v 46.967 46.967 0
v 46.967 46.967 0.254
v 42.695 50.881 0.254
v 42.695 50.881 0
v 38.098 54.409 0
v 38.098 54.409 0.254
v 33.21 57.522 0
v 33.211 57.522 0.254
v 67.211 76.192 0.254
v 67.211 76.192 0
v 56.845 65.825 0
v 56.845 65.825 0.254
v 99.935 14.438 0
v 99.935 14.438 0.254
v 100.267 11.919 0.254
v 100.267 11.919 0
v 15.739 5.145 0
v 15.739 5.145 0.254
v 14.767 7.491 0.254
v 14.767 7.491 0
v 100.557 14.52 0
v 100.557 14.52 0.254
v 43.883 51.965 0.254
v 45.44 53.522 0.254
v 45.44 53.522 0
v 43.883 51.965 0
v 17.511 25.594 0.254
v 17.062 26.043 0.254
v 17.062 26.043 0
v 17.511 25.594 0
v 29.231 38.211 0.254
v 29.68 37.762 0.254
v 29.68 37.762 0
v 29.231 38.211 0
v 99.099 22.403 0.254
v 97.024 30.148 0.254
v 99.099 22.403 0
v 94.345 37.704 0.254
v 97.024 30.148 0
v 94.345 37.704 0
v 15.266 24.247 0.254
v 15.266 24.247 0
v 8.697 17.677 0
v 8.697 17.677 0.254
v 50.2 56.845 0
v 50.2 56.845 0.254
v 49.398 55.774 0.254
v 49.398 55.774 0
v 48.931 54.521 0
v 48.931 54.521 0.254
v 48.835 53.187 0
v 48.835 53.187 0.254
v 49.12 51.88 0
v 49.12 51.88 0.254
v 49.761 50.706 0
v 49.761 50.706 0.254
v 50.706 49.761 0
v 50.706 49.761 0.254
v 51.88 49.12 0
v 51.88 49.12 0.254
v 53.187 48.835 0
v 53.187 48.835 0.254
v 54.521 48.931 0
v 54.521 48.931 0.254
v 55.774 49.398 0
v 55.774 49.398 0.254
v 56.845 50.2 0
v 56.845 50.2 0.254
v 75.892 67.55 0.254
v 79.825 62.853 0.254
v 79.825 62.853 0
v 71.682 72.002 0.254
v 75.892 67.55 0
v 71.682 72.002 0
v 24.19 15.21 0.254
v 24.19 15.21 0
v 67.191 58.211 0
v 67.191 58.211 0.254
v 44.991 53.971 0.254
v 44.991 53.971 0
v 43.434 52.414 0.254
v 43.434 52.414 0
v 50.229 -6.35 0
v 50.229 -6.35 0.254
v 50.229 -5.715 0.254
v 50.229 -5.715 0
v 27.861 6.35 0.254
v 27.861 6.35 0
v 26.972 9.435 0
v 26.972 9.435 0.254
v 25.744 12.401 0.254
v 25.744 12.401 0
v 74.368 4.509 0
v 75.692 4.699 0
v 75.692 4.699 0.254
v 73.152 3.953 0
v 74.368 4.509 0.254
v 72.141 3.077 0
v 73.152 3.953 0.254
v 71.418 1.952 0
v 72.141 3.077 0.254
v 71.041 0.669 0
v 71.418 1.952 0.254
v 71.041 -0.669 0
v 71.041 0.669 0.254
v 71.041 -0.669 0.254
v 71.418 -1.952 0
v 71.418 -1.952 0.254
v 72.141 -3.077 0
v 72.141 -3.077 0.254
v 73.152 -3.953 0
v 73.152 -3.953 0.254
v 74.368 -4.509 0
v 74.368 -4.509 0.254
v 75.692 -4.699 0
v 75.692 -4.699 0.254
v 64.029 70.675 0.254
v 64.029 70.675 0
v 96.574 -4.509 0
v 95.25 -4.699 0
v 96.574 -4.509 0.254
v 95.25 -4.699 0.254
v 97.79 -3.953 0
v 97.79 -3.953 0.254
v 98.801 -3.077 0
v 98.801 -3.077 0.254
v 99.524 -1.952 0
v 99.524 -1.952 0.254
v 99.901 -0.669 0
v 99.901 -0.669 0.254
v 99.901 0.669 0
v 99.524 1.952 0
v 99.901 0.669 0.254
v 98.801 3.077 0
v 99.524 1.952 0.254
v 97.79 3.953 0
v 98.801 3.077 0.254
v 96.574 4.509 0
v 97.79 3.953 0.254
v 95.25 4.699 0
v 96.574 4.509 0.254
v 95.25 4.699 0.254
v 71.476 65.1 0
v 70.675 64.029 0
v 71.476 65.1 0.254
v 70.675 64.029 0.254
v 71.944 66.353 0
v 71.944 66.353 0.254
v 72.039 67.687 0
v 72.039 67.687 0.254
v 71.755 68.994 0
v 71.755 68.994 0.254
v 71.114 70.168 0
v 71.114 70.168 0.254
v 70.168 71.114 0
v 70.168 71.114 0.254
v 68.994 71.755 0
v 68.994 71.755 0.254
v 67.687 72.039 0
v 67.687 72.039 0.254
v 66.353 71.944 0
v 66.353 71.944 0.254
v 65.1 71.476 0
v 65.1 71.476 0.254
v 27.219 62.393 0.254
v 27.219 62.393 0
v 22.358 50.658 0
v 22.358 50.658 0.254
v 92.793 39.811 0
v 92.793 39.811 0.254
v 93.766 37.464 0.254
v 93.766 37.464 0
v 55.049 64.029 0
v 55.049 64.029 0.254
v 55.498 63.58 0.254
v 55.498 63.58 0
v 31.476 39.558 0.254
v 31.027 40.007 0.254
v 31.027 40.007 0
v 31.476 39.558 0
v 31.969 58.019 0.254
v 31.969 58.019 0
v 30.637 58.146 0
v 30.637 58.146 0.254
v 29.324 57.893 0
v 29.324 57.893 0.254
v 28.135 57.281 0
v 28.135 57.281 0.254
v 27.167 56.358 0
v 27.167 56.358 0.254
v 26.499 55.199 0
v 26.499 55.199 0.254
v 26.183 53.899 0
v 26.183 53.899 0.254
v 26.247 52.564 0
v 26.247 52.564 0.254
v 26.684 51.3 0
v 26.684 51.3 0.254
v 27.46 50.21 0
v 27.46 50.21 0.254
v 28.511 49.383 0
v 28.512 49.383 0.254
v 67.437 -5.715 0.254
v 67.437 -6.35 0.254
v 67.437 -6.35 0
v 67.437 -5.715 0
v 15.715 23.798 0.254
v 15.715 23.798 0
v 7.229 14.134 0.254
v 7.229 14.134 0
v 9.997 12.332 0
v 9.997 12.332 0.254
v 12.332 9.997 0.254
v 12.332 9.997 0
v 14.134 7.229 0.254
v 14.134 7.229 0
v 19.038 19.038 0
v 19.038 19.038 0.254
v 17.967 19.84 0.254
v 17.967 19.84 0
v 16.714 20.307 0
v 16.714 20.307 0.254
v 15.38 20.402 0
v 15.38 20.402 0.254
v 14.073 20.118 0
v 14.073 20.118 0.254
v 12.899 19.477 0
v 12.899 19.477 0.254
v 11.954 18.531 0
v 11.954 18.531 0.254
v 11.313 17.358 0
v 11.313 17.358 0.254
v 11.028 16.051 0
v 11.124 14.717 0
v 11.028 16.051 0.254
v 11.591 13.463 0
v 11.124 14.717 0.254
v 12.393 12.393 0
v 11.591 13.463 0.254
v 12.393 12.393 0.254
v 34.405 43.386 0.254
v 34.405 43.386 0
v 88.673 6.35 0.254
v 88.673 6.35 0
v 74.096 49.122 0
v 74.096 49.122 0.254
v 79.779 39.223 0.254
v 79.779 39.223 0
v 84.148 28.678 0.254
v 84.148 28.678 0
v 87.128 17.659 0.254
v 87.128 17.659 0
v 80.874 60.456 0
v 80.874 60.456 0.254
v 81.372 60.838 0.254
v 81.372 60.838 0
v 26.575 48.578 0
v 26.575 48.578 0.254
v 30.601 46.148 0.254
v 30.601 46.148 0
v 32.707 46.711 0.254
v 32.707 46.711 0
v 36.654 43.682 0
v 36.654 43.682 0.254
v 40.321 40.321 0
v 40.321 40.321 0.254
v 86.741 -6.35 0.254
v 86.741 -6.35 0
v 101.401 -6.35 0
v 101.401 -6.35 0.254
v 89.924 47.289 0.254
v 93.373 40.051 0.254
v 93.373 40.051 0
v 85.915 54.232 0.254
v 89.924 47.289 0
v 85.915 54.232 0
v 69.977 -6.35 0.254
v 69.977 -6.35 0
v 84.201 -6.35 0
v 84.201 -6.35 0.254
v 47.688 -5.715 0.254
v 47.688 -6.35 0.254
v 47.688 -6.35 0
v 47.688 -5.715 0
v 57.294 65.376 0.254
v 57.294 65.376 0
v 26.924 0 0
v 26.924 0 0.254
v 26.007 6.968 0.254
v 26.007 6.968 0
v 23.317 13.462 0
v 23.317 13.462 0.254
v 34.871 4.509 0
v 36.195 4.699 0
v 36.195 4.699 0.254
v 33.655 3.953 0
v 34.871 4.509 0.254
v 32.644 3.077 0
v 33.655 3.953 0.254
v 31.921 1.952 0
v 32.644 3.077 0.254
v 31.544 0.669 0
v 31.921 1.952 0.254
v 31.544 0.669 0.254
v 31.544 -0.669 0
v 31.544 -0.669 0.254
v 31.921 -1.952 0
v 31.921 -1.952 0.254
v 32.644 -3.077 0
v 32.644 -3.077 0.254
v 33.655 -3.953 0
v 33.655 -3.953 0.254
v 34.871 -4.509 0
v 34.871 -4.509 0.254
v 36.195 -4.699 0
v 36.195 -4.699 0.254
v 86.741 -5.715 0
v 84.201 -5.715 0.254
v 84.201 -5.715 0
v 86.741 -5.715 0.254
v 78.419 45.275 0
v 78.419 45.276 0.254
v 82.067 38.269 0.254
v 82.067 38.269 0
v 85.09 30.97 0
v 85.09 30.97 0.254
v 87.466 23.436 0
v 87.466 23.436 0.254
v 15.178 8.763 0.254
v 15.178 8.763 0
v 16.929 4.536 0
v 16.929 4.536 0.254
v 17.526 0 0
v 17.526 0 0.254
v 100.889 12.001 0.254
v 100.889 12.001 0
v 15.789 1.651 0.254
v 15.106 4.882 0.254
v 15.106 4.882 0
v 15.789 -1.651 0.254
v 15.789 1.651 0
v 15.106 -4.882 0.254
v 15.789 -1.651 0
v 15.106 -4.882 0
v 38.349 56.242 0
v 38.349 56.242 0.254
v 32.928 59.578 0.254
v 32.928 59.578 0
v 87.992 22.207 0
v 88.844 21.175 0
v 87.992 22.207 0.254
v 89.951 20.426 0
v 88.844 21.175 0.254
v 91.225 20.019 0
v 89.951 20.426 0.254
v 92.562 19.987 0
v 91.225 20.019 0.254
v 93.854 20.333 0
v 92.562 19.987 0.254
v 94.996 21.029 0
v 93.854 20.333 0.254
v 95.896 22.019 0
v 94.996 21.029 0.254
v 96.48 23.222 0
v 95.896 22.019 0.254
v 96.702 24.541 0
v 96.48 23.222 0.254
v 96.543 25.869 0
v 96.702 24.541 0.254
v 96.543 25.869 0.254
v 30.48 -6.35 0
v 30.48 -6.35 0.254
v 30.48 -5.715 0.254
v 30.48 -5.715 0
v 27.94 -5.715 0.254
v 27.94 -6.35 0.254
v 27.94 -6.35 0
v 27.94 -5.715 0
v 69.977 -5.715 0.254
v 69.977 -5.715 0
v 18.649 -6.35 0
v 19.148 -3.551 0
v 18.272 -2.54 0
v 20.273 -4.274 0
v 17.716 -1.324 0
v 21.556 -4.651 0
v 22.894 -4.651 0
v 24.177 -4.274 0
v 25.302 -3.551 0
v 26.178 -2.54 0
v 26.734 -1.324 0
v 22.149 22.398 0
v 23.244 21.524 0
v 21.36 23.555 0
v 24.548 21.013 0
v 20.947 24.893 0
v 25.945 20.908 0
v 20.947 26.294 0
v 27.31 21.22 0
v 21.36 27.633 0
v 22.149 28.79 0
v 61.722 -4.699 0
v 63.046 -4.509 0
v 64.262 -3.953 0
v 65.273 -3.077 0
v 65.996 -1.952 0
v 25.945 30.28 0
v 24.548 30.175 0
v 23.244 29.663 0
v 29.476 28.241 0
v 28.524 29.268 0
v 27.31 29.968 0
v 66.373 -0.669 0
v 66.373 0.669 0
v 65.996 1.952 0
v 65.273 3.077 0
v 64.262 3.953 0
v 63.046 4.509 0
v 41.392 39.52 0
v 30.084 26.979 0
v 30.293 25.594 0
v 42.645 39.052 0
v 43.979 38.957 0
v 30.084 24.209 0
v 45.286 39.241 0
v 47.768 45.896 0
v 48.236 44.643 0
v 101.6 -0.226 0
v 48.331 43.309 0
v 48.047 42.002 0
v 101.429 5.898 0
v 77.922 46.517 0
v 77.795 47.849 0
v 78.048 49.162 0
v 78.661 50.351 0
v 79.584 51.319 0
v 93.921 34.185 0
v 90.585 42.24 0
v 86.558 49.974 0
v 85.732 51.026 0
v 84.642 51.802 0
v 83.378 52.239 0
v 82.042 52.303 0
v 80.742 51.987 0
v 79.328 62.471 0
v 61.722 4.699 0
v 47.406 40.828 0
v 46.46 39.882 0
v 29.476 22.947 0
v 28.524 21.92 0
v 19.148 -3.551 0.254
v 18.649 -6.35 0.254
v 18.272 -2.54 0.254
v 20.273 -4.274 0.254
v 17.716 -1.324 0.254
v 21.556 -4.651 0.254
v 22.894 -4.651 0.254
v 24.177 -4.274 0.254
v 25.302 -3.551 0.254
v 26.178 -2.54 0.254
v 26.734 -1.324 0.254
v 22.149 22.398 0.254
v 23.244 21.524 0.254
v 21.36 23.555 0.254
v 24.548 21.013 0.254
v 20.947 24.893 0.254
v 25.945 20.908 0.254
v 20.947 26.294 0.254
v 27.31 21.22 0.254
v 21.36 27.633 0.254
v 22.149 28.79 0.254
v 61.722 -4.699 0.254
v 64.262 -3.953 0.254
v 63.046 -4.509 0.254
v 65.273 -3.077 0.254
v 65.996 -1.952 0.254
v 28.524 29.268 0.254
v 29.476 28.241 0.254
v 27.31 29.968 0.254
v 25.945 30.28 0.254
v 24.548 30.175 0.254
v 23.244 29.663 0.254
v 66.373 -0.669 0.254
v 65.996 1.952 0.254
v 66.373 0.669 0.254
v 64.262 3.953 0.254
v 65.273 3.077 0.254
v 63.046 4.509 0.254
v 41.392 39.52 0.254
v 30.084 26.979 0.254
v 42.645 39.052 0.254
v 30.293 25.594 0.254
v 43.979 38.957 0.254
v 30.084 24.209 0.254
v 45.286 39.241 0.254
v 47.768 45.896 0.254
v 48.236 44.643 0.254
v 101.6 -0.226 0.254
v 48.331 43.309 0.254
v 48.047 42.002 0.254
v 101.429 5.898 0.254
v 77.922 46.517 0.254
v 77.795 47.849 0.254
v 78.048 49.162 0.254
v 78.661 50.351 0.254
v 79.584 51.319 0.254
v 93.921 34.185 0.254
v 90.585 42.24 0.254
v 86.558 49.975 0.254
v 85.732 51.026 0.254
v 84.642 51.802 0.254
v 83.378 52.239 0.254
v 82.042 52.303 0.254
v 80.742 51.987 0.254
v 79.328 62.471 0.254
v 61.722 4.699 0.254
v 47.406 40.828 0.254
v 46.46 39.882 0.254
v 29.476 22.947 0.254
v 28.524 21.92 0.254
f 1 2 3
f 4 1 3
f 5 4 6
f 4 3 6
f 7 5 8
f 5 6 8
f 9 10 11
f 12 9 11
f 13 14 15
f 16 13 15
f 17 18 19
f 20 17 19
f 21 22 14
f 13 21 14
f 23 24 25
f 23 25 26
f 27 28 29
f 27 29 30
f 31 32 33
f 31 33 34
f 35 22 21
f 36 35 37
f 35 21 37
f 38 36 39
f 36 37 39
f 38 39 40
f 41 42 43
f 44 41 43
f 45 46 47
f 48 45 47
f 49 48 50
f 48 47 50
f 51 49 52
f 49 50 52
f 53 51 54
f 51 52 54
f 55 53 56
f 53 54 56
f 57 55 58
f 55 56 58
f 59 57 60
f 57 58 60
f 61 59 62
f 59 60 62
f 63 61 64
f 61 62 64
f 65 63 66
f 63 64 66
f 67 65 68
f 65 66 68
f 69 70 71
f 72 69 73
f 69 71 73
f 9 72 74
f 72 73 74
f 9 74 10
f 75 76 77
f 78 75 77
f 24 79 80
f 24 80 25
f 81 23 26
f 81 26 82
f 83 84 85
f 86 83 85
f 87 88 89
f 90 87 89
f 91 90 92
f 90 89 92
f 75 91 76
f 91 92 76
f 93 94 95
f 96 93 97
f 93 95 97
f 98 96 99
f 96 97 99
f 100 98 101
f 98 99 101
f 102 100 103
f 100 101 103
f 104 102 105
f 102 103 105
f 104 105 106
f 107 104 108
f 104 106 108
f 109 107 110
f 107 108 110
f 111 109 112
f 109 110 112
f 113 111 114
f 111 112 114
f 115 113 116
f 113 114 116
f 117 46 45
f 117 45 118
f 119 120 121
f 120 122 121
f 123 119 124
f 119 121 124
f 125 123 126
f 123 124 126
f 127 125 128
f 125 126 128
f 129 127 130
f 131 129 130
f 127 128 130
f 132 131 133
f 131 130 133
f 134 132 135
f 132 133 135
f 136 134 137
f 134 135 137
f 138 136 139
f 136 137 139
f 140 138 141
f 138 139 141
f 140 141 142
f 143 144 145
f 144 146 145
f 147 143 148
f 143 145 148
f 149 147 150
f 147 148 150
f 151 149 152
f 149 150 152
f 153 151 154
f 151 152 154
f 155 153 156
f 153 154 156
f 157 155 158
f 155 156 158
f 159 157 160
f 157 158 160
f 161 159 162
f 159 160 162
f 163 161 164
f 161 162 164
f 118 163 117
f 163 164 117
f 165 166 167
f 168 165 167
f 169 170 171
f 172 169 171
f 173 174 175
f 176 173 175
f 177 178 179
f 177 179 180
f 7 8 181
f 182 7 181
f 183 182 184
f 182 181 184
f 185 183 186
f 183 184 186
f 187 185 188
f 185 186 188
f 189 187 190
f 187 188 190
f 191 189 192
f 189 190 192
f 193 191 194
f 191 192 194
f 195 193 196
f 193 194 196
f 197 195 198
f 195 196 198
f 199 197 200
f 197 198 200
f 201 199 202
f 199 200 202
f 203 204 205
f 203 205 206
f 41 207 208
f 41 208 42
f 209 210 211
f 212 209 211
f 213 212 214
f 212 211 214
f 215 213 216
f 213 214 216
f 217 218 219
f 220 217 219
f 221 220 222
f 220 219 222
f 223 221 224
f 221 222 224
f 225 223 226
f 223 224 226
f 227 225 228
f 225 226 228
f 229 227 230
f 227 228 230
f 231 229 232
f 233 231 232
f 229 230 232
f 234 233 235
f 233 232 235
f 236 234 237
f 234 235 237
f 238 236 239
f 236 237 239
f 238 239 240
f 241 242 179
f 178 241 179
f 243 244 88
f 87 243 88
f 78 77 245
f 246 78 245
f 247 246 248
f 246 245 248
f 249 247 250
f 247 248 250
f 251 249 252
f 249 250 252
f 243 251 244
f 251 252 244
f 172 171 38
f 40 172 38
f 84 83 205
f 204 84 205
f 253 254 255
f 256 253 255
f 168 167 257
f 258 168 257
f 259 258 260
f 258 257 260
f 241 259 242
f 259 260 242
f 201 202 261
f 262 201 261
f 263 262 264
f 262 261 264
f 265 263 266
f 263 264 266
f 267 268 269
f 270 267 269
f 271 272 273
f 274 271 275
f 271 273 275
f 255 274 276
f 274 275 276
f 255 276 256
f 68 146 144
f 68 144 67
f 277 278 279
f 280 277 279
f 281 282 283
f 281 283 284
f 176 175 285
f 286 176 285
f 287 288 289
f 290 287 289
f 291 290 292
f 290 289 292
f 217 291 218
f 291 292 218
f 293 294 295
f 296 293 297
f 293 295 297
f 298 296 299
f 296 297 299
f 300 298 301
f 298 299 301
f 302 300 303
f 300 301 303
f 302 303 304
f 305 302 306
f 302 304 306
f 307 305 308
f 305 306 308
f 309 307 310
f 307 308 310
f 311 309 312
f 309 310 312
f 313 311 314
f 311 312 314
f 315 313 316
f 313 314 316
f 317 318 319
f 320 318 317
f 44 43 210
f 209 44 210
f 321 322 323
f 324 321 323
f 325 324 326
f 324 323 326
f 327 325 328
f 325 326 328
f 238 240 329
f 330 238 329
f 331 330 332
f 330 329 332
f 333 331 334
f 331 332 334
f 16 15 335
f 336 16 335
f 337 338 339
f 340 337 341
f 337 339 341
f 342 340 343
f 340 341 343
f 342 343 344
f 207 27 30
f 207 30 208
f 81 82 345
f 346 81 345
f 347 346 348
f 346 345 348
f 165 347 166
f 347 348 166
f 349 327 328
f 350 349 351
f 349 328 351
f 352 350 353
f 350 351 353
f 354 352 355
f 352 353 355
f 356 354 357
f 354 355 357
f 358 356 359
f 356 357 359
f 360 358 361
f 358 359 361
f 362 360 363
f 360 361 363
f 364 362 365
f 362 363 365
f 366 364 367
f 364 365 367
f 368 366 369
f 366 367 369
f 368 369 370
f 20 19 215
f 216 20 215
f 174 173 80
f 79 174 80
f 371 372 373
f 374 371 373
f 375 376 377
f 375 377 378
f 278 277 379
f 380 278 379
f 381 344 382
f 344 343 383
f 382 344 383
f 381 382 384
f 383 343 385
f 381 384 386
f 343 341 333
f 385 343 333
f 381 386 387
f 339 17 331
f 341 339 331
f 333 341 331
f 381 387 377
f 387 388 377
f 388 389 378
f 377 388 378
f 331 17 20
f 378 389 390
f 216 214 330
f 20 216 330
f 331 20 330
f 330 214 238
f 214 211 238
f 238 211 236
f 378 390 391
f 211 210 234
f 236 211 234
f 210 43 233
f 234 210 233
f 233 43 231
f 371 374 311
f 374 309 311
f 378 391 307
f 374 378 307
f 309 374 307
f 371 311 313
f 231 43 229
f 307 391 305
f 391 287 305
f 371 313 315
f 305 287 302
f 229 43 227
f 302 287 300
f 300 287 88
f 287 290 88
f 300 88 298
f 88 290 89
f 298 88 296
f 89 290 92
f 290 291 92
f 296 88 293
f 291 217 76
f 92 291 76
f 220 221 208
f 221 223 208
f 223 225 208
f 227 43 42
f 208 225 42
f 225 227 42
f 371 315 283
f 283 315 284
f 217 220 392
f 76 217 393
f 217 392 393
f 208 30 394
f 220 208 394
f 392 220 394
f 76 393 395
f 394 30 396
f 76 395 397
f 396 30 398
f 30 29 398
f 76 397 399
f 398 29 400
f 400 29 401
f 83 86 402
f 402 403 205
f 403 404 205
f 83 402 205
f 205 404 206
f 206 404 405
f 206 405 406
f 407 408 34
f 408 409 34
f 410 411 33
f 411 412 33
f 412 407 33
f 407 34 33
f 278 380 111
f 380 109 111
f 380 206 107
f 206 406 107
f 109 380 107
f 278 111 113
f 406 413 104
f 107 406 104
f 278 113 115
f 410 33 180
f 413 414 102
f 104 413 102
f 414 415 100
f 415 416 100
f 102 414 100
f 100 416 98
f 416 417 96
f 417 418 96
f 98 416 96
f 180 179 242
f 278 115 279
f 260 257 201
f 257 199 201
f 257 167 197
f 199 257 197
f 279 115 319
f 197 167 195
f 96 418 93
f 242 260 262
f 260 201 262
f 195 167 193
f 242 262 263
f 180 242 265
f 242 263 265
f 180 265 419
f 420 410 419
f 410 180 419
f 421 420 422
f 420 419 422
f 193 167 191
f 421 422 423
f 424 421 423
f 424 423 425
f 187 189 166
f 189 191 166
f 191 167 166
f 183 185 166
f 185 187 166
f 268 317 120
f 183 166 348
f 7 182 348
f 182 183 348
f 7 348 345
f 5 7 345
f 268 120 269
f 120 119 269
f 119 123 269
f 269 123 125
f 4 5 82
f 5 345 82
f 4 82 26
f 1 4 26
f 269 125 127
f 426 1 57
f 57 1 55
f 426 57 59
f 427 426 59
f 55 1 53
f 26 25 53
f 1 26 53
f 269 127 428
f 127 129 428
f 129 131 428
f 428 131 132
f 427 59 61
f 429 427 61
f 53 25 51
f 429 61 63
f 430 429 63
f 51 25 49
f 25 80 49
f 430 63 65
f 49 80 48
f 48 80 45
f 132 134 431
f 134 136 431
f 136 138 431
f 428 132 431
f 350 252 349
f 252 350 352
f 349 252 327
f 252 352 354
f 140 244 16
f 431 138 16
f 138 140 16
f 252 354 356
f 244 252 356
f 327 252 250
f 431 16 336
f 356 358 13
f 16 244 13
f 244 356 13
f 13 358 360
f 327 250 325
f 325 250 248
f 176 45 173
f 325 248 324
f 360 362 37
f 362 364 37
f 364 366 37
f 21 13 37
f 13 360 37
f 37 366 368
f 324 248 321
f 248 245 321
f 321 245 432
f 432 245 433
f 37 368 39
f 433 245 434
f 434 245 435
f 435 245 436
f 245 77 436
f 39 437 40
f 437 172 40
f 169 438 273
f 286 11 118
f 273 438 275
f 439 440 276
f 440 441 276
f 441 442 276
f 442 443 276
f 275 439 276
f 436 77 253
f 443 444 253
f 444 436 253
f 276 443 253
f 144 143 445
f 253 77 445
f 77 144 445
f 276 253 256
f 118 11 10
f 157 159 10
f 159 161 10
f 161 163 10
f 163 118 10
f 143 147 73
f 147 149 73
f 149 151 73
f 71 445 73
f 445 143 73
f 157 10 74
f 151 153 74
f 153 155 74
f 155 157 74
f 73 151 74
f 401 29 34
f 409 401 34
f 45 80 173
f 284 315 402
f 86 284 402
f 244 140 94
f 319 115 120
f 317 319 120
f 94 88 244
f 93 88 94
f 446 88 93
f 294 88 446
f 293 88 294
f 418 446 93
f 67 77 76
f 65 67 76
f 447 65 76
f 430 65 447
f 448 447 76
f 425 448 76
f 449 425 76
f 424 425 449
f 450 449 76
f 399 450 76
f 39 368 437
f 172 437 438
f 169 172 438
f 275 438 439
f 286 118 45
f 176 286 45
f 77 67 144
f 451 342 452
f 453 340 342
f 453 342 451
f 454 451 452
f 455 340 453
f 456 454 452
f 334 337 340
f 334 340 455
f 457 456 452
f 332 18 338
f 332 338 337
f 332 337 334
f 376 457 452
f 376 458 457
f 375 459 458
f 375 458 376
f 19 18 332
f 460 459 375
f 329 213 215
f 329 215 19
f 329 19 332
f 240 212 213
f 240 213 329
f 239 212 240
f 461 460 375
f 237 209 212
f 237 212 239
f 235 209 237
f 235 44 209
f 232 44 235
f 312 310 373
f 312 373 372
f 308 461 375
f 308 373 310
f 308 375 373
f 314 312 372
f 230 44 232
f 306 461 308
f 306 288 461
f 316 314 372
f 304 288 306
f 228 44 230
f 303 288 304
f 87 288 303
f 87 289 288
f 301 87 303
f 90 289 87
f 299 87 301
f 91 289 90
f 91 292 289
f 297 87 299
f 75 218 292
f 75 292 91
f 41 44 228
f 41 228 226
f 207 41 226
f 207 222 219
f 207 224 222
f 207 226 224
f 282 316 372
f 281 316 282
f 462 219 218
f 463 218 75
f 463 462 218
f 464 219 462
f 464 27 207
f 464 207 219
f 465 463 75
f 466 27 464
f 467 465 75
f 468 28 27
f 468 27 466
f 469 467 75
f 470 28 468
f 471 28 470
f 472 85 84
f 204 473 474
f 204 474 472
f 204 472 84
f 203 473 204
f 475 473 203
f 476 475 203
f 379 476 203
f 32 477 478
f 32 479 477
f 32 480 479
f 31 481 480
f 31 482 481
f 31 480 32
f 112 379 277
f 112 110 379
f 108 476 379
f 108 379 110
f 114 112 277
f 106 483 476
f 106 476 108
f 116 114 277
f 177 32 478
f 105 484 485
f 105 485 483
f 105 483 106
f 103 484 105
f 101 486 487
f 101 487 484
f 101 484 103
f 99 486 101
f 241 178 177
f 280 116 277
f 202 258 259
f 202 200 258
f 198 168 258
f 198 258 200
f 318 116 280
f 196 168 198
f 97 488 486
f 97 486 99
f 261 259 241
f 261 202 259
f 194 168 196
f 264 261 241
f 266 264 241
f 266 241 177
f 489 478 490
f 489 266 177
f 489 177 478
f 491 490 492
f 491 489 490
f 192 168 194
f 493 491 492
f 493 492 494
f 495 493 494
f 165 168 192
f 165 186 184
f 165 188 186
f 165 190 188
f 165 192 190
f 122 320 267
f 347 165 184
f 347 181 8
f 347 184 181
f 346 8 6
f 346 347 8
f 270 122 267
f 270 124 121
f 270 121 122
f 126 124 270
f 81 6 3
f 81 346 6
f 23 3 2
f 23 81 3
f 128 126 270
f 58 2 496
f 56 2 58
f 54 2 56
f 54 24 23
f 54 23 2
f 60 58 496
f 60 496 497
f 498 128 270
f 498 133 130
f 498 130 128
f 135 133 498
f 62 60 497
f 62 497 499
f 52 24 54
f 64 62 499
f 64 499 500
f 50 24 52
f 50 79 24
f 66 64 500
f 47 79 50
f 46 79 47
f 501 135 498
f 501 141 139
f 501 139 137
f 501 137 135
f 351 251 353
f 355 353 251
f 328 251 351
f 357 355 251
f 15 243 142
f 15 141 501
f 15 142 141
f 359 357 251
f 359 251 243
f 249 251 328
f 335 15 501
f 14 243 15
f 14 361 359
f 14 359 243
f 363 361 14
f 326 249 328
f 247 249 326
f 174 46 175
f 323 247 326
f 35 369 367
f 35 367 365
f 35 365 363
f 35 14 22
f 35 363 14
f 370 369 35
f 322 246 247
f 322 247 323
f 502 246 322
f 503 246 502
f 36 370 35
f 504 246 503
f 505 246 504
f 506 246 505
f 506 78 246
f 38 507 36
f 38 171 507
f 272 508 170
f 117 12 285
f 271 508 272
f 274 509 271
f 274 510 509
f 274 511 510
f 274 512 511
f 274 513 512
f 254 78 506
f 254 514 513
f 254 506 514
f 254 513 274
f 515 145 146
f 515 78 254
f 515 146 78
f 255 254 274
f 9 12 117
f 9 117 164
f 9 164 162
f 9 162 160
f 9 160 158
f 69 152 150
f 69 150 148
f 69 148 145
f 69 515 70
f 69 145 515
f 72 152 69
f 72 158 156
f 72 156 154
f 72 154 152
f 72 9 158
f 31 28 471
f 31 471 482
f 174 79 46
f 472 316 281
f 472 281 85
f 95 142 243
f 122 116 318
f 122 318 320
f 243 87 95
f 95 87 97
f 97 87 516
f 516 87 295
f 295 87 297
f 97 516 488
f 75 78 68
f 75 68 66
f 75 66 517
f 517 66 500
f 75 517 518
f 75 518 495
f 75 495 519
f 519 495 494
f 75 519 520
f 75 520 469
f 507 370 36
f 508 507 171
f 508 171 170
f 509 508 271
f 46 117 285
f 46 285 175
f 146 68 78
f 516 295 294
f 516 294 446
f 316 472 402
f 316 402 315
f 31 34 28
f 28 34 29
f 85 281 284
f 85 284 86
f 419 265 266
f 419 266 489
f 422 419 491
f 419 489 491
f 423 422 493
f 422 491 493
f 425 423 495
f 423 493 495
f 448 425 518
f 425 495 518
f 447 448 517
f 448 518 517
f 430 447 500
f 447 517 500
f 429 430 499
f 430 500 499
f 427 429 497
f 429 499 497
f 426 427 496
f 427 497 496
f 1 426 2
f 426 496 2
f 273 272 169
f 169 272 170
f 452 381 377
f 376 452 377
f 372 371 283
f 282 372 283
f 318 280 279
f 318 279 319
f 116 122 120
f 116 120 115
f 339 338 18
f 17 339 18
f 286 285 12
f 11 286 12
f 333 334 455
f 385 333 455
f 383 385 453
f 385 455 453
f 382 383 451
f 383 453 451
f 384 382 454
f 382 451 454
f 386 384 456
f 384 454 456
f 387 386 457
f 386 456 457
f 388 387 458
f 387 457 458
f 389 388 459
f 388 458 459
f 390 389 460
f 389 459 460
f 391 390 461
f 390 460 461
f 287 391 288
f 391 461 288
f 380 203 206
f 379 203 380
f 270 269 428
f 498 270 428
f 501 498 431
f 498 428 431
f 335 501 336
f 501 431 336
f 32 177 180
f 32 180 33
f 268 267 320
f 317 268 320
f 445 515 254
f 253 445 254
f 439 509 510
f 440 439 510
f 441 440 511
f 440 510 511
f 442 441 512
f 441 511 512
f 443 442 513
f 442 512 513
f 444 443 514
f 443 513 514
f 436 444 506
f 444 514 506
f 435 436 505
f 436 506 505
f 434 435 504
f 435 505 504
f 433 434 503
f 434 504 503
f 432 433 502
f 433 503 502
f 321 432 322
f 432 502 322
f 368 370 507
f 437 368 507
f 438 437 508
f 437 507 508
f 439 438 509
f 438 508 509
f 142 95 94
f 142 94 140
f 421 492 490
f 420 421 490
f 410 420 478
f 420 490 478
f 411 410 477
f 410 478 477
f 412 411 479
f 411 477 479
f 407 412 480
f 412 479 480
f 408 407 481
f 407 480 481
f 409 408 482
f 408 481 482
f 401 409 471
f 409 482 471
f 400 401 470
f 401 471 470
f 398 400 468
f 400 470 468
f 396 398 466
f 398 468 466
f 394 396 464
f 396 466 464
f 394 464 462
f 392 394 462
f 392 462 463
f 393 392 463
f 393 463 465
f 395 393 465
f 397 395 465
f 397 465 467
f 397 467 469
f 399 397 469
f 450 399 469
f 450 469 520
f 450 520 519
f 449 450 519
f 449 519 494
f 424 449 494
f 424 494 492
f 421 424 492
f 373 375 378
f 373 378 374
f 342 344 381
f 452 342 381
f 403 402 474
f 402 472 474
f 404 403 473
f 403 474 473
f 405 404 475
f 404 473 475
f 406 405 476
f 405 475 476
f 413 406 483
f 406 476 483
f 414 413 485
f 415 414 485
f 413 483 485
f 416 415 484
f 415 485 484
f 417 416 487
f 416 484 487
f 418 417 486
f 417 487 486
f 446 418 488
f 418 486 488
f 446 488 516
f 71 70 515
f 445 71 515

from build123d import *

# Parameters (mm, degrees)
BOSS_EXTRUDE1_DEPTH = 0.254
SKETCH2_R           = 4.699
CUT_EXTRUDE1_DEPTH  = 1.254
SKETCH3_W           = 2.54
SKETCH3_H           = 0.635
CUT_EXTRUDE2_DEPTH  = 1.254
CUT_EXTRUDE3_DEPTH  = 1.254


with BuildPart() as part:
    # Sketch1 → Boss-Extrude1 (new body)
    with BuildSketch(Plane.XY):
        with BuildLine():
            Line((27.218819563, 62.393373411), (22.357699804, 50.65759216))
            ThreePointArc((22.357699804, 50.65759216), (28.61353693, 47.405947816), (34.405475059, 43.38573118))
            Line((34.405475059, 43.38573118), (8.696654013, 17.676910134))
            Line((8.696654013, 17.676910134), (7.228954972, 14.133571205))
            ThreePointArc((7.228954972, 14.133571205), (14.666587579, 6.075099489), (15.105587123, -4.88230096))
            Line((15.105587123, -4.88230096), (18.648926052, -6.35))
            Line((18.648926052, -6.35), (101.401368334, -6.35))
            ThreePointArc((101.401368334, -6.35), (93.866160503, 38.880636728), (67.21146711, 76.191723231))
            Line((67.21146711, 76.191723231), (43.43415954, 52.414415661))
            ThreePointArc((43.43415954, 52.414415661), (35.677104191, 57.973626939), (27.218819563, 62.393373411))
        make_face()
        with BuildLine():
            Line((88.672924278, 6.35), (27.86051193, 6.35))
            ThreePointArc((27.86051193, 6.35), (26.399857642, 10.93517908), (24.190484974, 15.210228852))
            Line((24.190484974, 15.210228852), (67.191354125, 58.211098004))
            ThreePointArc((67.191354125, 58.211098004), (82.13289044, 34.020557137), (88.672924278, 6.35))
        make_face(mode=Mode.SUBTRACT)
    extrude(amount=BOSS_EXTRUDE1_DEPTH)

    # Sketch2 → Cut-Extrude1 (cut, through all)
    with BuildSketch(Plane.XY.offset(0.254)):
        with Locations((22.225, 0)):
            Circle(SKETCH2_R)
        with Locations((36.195, 0)):
            Circle(SKETCH2_R)
        with Locations((61.722, 0)):
            Circle(SKETCH2_R)
        with Locations((75.692, 0)):
            Circle(SKETCH2_R)
        with Locations((95.25, 0)):
            Circle(SKETCH2_R)
        with Locations((15.715448212, 15.715448212)):
            Circle(SKETCH2_R)
        with Locations((25.593729945, 25.593729945)):
            Circle(SKETCH2_R)
        with Locations((43.644044748, 43.644044748)):
            Circle(SKETCH2_R)
        with Locations((53.522326482, 53.522326482)):
            Circle(SKETCH2_R)
        with Locations((92.004434954, 24.652514046)):
            Circle(SKETCH2_R)
        with Locations((82.48891971, 47.625)):
            Circle(SKETCH2_R)
        with Locations((67.351920908, 67.351920908)):
            Circle(SKETCH2_R)
        with Locations((30.861, 53.452819972)):
            Circle(SKETCH2_R)
    extrude(amount=-CUT_EXTRUDE1_DEPTH, mode=Mode.SUBTRACT)

    # Sketch3 → Cut-Extrude2 (cut, through all)
    with BuildSketch(Plane.XY.offset(0.254)):
        Polygon((15.266435406, 24.246691527), (17.06248663, 26.042742751), (17.511499436, 25.593729945), (15.715448212, 23.797678721), align=None)
        Polygon((43.43415954, 52.414415661), (44.991083167, 53.971339288), (45.440095973, 53.522326482), (43.883172346, 51.965402855), align=None)
        with Locations((29.21, -6.0325)):
            Rectangle(SKETCH3_W, SKETCH3_H)
        with Locations((68.707, -6.0325)):
            Rectangle(SKETCH3_W, SKETCH3_H)
        Polygon((29.230733674, 38.210989795), (31.026784898, 40.007041019), (31.475797704, 39.558028213), (29.67974648, 37.761976989), align=None)
        Polygon((56.845021246, 65.825277367), (55.048970022, 64.029226143), (55.497982828, 63.580213337), (57.294034052, 65.376264561), align=None)
        with Locations((48.9585, -6.0325)):
            Rectangle(SKETCH3_W, SKETCH3_H)
        with Locations((85.471, -6.0325)):
            Rectangle(SKETCH3_W, SKETCH3_H)
        Polygon((99.935462164, 14.437711971), (100.266998693, 11.919442024), (101.526133667, 12.085210288), (101.194597138, 14.603480236), align=None)
        Polygon((93.765504959, 37.464305742), (94.938831965, 37.950313702), (93.966816047, 40.296967714), (92.793489041, 39.810959755), align=None)
        Polygon((79.327792988, 62.471156422), (80.874047017, 60.456038938), (81.88160576, 61.229165953), (80.33535173, 63.244283437), align=None)
        Polygon((13.593916116, 7.005422516), (14.565932035, 4.658768503), (15.739259041, 5.144776462), (14.767243123, 7.491430475), align=None)
    extrude(amount=-CUT_EXTRUDE2_DEPTH, mode=Mode.SUBTRACT)

    # Sketch7 → Cut-Extrude3 (cut, through all)
    with BuildSketch(Plane.XY.offset(0.254)):
        with BuildLine():
            Line((36.195, 4.699), (61.722, 4.699))
            ThreePointArc((61.722, 4.699), (66.421, 0), (61.722, -4.699))
            Line((61.722, -4.699), (36.195, -4.699))
            ThreePointArc((36.195, -4.699), (31.496, 0), (36.195, 4.699))
        make_face()
        with BuildLine():
            Line((75.692, 4.699), (95.25, 4.699))
            ThreePointArc((95.25, 4.699), (99.949, 0), (95.25, -4.699))
            Line((95.25, -4.699), (75.692, -4.699))
            ThreePointArc((75.692, -4.699), (70.993, 0), (75.692, 4.699))
        make_face()
        with BuildLine():
            Line((50.199631717, 56.845021246), (64.029226143, 70.674615673))
            ThreePointArc((64.029226143, 70.674615673), (70.674615673, 70.674615673), (70.674615673, 64.029226143))
            Line((70.674615673, 64.029226143), (56.845021246, 50.199631717))
            ThreePointArc((56.845021246, 50.199631717), (50.199631717, 50.199631717), (50.199631717, 56.845021246))
        make_face()
        with BuildLine():
            ThreePointArc((46.966739513, 46.966739513), (40.434542876, 52.695322215), (33.2105, 57.522273345))
            ThreePointArc((33.2105, 57.522273345), (26.791546628, 55.802319972), (28.5115, 49.3833666))
            ThreePointArc((28.5115, 49.3833666), (34.713402966, 45.239387523), (40.321349984, 40.321349984))
            ThreePointArc((40.321349984, 40.321349984), (46.966739513, 40.321349984), (46.966739513, 46.966739513))
        make_face()
        with BuildLine():
            ThreePointArc((26.924, 0), (24.874532533, 10.303368733), (19.038142977, 19.038142977))
            ThreePointArc((19.038142977, 19.038142977), (12.392753447, 19.038142977), (12.392753447, 12.392753447))
            ThreePointArc((12.392753447, 12.392753447), (16.191912687, 6.706909836), (17.526, 0))
            ThreePointArc((17.526, 0), (22.225, -4.699), (26.924, 0))
        make_face()
        with BuildLine():
            ThreePointArc((96.543320412, 25.868704739), (92.340835395, 38.248826381), (86.558373083, 49.9745))
            ThreePointArc((86.558373083, 49.9745), (80.13941971, 51.694453372), (78.419466338, 45.2755))
            ThreePointArc((78.419466338, 45.2755), (83.658215548, 34.652367484), (87.465549496, 23.436323353))
            ThreePointArc((87.465549496, 23.436323353), (93.220625647, 20.113628588), (96.543320412, 25.868704739))
        make_face()
    extrude(amount=-CUT_EXTRUDE3_DEPTH, mode=Mode.SUBTRACT)


solid = part.part
